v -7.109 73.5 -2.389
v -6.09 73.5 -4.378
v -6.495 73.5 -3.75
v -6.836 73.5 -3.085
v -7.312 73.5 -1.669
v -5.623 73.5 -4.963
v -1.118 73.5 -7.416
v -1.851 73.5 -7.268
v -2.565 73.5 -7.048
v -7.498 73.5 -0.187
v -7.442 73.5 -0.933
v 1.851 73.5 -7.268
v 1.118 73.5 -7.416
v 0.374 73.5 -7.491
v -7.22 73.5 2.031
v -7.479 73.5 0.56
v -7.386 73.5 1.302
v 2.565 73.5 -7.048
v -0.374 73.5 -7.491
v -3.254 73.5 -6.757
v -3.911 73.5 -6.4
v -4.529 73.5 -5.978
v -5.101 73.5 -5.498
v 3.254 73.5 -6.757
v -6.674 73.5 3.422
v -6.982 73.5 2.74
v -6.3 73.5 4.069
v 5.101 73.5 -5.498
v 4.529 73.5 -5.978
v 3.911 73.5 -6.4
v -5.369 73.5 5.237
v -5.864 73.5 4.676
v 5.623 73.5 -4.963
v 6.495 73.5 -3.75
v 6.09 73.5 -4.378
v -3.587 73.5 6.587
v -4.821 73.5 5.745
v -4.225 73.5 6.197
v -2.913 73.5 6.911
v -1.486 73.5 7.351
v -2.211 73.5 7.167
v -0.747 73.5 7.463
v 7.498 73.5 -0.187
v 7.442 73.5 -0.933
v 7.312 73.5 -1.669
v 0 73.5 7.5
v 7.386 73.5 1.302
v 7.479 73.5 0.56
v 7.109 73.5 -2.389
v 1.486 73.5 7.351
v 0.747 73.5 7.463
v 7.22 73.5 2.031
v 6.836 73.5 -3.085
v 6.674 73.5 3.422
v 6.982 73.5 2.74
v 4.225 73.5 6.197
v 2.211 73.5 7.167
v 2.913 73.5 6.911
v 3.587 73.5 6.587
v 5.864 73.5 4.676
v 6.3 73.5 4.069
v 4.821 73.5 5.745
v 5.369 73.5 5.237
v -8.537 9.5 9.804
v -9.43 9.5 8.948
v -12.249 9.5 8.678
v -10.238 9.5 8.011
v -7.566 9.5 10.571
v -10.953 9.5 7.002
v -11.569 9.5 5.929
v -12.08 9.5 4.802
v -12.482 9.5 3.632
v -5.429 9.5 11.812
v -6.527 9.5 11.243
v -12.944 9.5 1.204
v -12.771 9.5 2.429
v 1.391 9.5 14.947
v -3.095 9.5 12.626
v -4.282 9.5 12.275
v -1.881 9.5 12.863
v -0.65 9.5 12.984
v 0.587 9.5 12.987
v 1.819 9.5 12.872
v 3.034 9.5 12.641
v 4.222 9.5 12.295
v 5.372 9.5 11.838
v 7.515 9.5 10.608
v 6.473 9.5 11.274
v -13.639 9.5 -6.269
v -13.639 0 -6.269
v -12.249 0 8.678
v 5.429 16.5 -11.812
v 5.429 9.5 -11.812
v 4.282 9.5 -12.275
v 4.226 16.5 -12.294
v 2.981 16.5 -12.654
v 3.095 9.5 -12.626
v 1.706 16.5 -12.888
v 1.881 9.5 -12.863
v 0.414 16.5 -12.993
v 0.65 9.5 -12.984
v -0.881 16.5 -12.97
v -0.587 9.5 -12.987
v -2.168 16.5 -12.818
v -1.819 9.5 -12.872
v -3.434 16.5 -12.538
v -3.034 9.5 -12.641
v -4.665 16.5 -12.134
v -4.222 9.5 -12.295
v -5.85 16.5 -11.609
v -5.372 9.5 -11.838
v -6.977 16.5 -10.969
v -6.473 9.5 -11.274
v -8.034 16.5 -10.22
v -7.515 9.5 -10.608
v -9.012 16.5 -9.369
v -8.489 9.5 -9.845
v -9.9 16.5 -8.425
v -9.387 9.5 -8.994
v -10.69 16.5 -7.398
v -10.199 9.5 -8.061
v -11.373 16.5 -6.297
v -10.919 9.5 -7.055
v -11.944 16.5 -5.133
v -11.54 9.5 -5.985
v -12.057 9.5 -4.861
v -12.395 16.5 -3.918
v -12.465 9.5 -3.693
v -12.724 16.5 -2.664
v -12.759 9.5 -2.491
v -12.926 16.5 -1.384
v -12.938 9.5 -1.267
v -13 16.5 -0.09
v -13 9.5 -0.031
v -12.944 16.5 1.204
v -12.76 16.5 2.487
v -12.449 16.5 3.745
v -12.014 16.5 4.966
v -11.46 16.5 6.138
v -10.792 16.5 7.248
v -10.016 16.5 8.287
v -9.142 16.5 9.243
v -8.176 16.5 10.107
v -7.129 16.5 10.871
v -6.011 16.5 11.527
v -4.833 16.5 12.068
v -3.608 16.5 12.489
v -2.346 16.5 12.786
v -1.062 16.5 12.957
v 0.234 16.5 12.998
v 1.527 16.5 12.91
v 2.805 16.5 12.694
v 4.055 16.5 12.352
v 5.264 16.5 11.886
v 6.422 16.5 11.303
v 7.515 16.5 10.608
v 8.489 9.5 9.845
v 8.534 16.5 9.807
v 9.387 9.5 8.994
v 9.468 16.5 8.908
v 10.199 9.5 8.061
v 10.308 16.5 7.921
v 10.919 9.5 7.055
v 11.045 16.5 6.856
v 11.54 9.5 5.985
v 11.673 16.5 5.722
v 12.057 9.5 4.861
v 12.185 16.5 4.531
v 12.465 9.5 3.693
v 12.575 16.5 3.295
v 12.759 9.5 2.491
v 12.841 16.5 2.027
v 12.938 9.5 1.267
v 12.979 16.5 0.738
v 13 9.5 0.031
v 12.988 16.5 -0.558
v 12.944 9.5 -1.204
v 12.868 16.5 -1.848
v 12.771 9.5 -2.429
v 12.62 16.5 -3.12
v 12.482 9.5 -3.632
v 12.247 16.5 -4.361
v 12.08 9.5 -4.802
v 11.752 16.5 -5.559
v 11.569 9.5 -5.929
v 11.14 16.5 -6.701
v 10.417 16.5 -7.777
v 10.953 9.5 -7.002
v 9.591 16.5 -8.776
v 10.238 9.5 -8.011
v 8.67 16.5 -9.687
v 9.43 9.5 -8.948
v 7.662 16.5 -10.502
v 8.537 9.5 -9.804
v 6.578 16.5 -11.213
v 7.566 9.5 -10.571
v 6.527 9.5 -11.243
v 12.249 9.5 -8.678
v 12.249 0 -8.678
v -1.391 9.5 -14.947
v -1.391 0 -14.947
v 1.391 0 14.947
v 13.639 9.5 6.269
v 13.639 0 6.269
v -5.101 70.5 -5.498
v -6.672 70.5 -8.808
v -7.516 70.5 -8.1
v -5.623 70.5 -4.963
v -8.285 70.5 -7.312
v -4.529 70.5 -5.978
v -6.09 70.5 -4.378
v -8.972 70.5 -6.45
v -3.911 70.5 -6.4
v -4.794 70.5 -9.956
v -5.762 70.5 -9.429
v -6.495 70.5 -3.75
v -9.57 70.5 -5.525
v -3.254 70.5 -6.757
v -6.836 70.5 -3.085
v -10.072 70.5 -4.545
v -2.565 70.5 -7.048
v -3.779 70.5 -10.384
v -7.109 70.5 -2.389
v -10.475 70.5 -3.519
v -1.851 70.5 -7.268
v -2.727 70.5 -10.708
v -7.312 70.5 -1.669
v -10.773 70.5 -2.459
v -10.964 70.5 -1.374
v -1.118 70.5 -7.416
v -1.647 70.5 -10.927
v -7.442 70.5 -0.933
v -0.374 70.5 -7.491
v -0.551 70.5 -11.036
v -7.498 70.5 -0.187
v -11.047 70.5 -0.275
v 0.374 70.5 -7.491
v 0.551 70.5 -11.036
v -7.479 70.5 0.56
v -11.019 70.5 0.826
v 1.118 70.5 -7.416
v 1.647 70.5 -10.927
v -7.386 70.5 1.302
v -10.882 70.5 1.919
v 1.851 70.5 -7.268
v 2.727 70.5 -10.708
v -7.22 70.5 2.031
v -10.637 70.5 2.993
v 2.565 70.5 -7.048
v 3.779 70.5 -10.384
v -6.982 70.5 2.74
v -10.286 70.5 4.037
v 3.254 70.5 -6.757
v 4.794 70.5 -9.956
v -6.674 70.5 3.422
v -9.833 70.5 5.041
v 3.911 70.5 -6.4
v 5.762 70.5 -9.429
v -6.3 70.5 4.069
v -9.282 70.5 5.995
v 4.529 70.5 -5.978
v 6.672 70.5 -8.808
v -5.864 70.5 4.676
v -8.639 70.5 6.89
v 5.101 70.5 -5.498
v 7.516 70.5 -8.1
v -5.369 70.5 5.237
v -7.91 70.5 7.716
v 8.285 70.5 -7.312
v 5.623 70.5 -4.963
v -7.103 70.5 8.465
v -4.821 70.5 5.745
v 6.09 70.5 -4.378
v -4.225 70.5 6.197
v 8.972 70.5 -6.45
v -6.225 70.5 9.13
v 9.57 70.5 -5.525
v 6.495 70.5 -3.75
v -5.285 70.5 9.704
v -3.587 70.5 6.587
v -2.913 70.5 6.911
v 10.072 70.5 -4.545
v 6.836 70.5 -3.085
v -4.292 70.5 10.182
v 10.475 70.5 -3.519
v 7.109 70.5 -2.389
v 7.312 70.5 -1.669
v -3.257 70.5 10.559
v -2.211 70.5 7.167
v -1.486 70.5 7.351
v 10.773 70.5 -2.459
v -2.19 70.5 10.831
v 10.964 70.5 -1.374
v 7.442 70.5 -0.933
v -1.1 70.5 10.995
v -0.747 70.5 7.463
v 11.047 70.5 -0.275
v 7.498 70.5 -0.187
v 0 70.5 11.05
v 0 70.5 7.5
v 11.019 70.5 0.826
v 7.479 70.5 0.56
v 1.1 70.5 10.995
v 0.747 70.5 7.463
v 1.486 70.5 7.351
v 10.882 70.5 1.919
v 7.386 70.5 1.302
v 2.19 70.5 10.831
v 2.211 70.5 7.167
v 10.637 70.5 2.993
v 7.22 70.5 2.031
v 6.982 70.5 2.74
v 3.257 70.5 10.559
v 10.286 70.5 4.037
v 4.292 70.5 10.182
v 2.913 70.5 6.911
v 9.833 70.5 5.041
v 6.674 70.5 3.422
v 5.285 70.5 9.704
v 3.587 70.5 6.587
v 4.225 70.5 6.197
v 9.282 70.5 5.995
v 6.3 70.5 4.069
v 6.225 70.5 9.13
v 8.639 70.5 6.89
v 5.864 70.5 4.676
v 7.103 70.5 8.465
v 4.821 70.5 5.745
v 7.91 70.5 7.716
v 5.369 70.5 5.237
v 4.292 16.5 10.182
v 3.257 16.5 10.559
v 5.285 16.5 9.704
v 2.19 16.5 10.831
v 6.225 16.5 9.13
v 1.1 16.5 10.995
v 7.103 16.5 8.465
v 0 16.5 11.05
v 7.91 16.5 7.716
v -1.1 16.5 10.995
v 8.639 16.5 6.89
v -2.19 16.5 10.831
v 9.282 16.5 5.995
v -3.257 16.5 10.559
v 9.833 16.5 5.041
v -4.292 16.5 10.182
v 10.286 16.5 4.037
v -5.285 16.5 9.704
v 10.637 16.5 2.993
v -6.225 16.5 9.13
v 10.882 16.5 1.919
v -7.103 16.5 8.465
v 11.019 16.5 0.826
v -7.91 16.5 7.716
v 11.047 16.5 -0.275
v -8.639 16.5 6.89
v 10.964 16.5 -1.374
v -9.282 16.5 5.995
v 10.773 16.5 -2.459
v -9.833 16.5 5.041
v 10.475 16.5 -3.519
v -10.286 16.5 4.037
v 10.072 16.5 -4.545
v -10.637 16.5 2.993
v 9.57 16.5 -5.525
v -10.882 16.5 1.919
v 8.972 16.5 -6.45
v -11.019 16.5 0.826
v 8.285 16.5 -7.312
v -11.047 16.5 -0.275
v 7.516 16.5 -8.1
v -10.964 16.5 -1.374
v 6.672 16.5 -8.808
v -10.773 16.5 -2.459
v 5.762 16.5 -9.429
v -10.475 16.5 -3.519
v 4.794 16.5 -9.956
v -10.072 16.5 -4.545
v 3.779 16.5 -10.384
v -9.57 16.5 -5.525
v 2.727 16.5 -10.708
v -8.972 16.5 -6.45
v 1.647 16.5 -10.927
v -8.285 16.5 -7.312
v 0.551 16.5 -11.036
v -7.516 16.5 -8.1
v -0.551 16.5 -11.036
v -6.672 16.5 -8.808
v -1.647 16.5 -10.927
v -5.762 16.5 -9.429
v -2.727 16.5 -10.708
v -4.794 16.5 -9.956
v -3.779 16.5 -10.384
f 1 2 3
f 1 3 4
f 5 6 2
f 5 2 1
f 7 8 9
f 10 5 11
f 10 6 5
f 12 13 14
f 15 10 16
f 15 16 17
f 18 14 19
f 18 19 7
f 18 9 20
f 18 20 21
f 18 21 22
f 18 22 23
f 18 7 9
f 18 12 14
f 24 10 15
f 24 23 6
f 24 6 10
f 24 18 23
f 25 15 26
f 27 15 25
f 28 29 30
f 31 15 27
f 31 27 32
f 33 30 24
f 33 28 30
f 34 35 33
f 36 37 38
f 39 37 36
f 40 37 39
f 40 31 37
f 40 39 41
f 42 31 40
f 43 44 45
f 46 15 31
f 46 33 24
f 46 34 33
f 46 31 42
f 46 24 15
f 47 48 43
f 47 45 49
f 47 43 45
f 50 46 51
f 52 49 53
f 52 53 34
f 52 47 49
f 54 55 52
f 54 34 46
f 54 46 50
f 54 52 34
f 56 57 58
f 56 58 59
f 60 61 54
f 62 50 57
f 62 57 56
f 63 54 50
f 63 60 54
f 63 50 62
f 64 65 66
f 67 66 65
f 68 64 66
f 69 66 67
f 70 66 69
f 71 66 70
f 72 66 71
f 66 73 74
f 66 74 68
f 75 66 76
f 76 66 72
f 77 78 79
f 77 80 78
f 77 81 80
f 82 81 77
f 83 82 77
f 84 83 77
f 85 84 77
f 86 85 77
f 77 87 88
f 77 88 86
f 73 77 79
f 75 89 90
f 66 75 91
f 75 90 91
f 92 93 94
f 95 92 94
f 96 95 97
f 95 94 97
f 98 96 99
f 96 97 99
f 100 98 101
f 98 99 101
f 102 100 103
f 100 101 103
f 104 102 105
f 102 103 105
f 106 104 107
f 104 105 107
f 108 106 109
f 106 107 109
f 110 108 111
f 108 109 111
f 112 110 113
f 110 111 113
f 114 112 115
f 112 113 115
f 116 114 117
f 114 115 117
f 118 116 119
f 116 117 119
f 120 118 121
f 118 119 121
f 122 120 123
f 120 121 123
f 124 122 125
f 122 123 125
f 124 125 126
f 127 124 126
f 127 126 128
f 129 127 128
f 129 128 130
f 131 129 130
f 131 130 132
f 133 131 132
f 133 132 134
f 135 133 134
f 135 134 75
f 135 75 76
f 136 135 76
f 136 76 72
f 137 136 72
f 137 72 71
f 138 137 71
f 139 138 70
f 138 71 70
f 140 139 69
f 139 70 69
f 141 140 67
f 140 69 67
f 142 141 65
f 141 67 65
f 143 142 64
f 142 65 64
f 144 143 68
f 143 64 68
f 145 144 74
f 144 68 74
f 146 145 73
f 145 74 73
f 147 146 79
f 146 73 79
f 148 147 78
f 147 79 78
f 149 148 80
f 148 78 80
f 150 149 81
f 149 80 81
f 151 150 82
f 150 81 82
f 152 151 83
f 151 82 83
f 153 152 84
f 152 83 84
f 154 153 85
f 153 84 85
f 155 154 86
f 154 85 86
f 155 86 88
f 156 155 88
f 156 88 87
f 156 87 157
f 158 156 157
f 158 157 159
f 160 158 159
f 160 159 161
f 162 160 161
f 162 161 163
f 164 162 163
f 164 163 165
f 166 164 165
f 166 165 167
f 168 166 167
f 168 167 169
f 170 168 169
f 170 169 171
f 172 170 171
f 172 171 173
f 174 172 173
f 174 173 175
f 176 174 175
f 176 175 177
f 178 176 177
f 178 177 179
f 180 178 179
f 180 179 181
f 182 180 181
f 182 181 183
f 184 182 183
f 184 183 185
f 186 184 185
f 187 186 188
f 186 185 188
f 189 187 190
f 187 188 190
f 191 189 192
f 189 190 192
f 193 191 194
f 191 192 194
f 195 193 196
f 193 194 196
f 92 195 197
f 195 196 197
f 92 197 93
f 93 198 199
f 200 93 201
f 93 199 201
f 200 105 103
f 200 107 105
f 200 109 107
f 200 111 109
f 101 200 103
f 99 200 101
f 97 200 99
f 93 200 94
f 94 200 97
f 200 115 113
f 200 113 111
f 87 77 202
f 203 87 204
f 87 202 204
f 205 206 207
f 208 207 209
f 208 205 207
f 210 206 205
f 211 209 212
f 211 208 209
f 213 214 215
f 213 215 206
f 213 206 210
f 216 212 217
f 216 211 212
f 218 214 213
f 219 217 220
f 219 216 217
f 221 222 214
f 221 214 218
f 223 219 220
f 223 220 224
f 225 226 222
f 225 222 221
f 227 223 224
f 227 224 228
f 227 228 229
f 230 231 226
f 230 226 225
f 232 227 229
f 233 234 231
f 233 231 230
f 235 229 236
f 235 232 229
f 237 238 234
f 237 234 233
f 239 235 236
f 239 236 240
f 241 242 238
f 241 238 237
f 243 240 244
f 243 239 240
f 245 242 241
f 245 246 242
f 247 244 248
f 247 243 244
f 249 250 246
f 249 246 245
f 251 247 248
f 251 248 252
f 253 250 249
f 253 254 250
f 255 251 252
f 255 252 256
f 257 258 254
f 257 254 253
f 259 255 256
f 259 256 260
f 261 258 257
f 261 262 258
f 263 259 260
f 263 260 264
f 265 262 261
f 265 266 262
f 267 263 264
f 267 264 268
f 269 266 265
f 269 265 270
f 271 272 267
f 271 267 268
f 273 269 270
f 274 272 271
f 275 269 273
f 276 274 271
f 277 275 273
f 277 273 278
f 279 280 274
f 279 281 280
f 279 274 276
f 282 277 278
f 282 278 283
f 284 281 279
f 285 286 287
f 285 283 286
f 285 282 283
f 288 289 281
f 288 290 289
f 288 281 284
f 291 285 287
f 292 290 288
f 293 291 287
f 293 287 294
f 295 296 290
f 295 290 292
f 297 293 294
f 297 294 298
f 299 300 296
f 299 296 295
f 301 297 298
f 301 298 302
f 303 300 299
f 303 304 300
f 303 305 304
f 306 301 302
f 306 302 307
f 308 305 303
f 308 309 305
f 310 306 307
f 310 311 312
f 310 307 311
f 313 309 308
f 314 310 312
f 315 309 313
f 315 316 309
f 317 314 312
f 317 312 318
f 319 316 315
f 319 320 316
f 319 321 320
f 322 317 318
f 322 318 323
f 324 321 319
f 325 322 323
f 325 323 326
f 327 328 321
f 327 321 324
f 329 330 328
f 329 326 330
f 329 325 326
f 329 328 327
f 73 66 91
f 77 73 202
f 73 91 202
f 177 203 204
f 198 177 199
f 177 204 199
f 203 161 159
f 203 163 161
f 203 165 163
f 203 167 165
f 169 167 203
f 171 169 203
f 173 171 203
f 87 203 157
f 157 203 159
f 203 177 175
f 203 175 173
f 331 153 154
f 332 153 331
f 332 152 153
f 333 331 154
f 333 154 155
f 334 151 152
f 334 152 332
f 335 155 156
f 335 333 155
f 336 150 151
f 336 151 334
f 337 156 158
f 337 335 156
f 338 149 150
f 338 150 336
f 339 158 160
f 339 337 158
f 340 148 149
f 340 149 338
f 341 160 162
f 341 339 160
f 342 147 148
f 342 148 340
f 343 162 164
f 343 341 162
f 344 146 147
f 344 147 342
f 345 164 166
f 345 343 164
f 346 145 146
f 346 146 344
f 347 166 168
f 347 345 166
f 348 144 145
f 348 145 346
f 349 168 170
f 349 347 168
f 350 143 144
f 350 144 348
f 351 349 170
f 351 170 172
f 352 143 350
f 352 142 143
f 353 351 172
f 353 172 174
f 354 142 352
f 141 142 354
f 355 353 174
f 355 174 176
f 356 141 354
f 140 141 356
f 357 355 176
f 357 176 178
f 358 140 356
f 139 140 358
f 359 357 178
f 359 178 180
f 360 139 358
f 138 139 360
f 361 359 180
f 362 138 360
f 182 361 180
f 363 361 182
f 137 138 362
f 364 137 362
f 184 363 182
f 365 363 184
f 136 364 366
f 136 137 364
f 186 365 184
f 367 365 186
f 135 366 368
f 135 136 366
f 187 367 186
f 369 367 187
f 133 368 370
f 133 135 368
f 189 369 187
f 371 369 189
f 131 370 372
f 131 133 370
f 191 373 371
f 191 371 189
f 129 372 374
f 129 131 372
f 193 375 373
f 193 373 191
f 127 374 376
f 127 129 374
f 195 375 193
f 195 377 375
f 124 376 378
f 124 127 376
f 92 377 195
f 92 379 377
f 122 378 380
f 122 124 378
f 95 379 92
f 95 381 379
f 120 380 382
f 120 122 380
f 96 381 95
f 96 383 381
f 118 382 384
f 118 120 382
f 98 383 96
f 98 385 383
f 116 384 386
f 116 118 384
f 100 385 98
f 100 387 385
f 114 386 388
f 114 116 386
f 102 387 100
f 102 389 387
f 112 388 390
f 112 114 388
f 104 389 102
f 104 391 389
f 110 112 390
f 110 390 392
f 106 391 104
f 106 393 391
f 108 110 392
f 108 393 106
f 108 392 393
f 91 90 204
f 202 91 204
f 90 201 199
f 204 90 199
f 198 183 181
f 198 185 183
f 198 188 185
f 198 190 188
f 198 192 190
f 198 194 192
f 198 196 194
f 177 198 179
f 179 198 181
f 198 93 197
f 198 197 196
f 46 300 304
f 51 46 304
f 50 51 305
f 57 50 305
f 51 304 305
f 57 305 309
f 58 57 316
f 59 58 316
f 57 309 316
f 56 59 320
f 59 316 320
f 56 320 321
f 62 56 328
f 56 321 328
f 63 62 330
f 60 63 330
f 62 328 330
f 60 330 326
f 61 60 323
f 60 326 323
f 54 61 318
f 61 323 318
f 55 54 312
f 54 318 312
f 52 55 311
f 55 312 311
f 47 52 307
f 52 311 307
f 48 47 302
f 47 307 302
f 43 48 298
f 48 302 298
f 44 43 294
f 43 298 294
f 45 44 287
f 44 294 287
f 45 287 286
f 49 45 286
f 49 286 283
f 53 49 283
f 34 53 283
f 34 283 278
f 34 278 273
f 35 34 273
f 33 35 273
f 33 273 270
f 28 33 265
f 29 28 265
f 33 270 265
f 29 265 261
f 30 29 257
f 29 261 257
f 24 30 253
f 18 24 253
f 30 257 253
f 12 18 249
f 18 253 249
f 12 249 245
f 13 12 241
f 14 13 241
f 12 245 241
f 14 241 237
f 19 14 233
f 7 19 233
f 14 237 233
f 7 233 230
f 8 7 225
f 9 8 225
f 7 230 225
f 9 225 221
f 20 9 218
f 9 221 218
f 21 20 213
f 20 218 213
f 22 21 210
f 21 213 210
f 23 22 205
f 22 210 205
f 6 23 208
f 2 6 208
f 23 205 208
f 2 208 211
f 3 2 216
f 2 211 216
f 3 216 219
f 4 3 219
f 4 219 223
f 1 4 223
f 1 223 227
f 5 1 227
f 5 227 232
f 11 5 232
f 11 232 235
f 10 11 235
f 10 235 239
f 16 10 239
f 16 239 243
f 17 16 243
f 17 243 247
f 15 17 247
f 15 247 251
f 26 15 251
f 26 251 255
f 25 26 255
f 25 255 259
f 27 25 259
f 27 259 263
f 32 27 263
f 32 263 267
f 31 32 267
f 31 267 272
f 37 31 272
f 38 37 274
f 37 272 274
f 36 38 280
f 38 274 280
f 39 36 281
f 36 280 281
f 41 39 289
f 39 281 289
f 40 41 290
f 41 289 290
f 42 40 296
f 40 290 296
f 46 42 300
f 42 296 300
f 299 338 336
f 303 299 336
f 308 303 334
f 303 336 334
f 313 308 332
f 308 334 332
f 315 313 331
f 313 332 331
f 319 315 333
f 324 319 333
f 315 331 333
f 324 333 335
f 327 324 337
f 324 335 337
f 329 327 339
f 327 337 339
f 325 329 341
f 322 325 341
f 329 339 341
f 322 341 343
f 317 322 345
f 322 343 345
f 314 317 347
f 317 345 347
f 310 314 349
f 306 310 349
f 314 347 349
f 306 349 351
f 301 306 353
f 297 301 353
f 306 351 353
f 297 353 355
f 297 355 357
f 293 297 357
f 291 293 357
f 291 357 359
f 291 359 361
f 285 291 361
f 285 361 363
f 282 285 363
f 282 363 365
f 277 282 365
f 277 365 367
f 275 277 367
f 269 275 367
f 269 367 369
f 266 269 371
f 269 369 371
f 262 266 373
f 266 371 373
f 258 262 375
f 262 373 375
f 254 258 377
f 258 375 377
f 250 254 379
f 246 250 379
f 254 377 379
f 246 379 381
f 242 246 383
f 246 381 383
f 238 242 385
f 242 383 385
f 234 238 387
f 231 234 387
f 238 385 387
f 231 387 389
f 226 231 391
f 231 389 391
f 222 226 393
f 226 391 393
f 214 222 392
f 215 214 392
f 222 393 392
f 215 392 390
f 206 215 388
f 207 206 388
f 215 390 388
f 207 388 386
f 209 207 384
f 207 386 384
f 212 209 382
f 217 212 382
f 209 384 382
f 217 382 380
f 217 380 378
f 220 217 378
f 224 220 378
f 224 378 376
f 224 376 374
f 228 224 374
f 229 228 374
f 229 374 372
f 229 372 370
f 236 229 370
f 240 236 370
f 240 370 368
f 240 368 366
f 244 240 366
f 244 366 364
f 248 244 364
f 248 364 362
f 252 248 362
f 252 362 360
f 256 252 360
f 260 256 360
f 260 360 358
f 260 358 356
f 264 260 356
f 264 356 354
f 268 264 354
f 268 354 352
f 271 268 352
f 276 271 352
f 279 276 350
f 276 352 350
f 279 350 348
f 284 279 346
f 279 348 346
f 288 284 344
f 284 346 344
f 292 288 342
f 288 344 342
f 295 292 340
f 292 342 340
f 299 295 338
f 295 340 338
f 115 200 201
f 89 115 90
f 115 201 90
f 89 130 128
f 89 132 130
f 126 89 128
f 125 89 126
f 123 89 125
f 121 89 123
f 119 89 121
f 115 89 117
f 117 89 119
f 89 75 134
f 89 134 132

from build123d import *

# Parameters (mm, degrees)
EXTRUDE_1_DEPTH = 9.5
SKETCH_2_R      = 13
EXTRUDE_2_DEPTH = 7
SKETCH_3_R      = 11.05
EXTRUDE_3_DEPTH = 54
SKETCH_4_R      = 7.5
EXTRUDE_4_DEPTH = 3


with BuildPart() as part:
    # 草图1 → 凸台-拉伸1 (new body)
    with BuildSketch(Plane(origin=(0, 0, 0), x_dir=(1, 0, 0), z_dir=(0, 1, 0))):
        Polygon((13.639438395, -6.268895724), (12.248742148, 8.677652282), (-1.390696247, 14.946548006), (-13.639438395, 6.268895724), (-12.248742148, -8.677652282), (1.390696247, -14.946548006), align=None)
    extrude(amount=EXTRUDE_1_DEPTH)

    # 草图2 → 凸台-拉伸2 (add)
    with BuildSketch(Plane(origin=(0, 9.5, 0), x_dir=(1, 0, 0), z_dir=(0, 1, 0))):
        with Locations(Location((0, 0, 0), (0, 0, 65.31576064))):
            Circle(SKETCH_2_R)
    extrude(amount=EXTRUDE_2_DEPTH)

    # 草图3 → 凸台-拉伸3 (add)
    with BuildSketch(Plane(origin=(0, 16.5, 0), x_dir=(1, 0, 0), z_dir=(0, 1, 0))):
        with Locations(Location((0, 0, 0), (0, 0, 270))):
            Circle(SKETCH_3_R)
    extrude(amount=EXTRUDE_3_DEPTH)

    # 草图4 → 凸台-拉伸4 (add)
    with BuildSketch(Plane(origin=(0, 70.5, 0), x_dir=(1, 0, 0), z_dir=(0, 1, 0))):
        with Locations(Location((0, 0, 0), (0, 0, 270))):
            Circle(SKETCH_4_R)
    extrude(amount=EXTRUDE_4_DEPTH)


solid = part.part
